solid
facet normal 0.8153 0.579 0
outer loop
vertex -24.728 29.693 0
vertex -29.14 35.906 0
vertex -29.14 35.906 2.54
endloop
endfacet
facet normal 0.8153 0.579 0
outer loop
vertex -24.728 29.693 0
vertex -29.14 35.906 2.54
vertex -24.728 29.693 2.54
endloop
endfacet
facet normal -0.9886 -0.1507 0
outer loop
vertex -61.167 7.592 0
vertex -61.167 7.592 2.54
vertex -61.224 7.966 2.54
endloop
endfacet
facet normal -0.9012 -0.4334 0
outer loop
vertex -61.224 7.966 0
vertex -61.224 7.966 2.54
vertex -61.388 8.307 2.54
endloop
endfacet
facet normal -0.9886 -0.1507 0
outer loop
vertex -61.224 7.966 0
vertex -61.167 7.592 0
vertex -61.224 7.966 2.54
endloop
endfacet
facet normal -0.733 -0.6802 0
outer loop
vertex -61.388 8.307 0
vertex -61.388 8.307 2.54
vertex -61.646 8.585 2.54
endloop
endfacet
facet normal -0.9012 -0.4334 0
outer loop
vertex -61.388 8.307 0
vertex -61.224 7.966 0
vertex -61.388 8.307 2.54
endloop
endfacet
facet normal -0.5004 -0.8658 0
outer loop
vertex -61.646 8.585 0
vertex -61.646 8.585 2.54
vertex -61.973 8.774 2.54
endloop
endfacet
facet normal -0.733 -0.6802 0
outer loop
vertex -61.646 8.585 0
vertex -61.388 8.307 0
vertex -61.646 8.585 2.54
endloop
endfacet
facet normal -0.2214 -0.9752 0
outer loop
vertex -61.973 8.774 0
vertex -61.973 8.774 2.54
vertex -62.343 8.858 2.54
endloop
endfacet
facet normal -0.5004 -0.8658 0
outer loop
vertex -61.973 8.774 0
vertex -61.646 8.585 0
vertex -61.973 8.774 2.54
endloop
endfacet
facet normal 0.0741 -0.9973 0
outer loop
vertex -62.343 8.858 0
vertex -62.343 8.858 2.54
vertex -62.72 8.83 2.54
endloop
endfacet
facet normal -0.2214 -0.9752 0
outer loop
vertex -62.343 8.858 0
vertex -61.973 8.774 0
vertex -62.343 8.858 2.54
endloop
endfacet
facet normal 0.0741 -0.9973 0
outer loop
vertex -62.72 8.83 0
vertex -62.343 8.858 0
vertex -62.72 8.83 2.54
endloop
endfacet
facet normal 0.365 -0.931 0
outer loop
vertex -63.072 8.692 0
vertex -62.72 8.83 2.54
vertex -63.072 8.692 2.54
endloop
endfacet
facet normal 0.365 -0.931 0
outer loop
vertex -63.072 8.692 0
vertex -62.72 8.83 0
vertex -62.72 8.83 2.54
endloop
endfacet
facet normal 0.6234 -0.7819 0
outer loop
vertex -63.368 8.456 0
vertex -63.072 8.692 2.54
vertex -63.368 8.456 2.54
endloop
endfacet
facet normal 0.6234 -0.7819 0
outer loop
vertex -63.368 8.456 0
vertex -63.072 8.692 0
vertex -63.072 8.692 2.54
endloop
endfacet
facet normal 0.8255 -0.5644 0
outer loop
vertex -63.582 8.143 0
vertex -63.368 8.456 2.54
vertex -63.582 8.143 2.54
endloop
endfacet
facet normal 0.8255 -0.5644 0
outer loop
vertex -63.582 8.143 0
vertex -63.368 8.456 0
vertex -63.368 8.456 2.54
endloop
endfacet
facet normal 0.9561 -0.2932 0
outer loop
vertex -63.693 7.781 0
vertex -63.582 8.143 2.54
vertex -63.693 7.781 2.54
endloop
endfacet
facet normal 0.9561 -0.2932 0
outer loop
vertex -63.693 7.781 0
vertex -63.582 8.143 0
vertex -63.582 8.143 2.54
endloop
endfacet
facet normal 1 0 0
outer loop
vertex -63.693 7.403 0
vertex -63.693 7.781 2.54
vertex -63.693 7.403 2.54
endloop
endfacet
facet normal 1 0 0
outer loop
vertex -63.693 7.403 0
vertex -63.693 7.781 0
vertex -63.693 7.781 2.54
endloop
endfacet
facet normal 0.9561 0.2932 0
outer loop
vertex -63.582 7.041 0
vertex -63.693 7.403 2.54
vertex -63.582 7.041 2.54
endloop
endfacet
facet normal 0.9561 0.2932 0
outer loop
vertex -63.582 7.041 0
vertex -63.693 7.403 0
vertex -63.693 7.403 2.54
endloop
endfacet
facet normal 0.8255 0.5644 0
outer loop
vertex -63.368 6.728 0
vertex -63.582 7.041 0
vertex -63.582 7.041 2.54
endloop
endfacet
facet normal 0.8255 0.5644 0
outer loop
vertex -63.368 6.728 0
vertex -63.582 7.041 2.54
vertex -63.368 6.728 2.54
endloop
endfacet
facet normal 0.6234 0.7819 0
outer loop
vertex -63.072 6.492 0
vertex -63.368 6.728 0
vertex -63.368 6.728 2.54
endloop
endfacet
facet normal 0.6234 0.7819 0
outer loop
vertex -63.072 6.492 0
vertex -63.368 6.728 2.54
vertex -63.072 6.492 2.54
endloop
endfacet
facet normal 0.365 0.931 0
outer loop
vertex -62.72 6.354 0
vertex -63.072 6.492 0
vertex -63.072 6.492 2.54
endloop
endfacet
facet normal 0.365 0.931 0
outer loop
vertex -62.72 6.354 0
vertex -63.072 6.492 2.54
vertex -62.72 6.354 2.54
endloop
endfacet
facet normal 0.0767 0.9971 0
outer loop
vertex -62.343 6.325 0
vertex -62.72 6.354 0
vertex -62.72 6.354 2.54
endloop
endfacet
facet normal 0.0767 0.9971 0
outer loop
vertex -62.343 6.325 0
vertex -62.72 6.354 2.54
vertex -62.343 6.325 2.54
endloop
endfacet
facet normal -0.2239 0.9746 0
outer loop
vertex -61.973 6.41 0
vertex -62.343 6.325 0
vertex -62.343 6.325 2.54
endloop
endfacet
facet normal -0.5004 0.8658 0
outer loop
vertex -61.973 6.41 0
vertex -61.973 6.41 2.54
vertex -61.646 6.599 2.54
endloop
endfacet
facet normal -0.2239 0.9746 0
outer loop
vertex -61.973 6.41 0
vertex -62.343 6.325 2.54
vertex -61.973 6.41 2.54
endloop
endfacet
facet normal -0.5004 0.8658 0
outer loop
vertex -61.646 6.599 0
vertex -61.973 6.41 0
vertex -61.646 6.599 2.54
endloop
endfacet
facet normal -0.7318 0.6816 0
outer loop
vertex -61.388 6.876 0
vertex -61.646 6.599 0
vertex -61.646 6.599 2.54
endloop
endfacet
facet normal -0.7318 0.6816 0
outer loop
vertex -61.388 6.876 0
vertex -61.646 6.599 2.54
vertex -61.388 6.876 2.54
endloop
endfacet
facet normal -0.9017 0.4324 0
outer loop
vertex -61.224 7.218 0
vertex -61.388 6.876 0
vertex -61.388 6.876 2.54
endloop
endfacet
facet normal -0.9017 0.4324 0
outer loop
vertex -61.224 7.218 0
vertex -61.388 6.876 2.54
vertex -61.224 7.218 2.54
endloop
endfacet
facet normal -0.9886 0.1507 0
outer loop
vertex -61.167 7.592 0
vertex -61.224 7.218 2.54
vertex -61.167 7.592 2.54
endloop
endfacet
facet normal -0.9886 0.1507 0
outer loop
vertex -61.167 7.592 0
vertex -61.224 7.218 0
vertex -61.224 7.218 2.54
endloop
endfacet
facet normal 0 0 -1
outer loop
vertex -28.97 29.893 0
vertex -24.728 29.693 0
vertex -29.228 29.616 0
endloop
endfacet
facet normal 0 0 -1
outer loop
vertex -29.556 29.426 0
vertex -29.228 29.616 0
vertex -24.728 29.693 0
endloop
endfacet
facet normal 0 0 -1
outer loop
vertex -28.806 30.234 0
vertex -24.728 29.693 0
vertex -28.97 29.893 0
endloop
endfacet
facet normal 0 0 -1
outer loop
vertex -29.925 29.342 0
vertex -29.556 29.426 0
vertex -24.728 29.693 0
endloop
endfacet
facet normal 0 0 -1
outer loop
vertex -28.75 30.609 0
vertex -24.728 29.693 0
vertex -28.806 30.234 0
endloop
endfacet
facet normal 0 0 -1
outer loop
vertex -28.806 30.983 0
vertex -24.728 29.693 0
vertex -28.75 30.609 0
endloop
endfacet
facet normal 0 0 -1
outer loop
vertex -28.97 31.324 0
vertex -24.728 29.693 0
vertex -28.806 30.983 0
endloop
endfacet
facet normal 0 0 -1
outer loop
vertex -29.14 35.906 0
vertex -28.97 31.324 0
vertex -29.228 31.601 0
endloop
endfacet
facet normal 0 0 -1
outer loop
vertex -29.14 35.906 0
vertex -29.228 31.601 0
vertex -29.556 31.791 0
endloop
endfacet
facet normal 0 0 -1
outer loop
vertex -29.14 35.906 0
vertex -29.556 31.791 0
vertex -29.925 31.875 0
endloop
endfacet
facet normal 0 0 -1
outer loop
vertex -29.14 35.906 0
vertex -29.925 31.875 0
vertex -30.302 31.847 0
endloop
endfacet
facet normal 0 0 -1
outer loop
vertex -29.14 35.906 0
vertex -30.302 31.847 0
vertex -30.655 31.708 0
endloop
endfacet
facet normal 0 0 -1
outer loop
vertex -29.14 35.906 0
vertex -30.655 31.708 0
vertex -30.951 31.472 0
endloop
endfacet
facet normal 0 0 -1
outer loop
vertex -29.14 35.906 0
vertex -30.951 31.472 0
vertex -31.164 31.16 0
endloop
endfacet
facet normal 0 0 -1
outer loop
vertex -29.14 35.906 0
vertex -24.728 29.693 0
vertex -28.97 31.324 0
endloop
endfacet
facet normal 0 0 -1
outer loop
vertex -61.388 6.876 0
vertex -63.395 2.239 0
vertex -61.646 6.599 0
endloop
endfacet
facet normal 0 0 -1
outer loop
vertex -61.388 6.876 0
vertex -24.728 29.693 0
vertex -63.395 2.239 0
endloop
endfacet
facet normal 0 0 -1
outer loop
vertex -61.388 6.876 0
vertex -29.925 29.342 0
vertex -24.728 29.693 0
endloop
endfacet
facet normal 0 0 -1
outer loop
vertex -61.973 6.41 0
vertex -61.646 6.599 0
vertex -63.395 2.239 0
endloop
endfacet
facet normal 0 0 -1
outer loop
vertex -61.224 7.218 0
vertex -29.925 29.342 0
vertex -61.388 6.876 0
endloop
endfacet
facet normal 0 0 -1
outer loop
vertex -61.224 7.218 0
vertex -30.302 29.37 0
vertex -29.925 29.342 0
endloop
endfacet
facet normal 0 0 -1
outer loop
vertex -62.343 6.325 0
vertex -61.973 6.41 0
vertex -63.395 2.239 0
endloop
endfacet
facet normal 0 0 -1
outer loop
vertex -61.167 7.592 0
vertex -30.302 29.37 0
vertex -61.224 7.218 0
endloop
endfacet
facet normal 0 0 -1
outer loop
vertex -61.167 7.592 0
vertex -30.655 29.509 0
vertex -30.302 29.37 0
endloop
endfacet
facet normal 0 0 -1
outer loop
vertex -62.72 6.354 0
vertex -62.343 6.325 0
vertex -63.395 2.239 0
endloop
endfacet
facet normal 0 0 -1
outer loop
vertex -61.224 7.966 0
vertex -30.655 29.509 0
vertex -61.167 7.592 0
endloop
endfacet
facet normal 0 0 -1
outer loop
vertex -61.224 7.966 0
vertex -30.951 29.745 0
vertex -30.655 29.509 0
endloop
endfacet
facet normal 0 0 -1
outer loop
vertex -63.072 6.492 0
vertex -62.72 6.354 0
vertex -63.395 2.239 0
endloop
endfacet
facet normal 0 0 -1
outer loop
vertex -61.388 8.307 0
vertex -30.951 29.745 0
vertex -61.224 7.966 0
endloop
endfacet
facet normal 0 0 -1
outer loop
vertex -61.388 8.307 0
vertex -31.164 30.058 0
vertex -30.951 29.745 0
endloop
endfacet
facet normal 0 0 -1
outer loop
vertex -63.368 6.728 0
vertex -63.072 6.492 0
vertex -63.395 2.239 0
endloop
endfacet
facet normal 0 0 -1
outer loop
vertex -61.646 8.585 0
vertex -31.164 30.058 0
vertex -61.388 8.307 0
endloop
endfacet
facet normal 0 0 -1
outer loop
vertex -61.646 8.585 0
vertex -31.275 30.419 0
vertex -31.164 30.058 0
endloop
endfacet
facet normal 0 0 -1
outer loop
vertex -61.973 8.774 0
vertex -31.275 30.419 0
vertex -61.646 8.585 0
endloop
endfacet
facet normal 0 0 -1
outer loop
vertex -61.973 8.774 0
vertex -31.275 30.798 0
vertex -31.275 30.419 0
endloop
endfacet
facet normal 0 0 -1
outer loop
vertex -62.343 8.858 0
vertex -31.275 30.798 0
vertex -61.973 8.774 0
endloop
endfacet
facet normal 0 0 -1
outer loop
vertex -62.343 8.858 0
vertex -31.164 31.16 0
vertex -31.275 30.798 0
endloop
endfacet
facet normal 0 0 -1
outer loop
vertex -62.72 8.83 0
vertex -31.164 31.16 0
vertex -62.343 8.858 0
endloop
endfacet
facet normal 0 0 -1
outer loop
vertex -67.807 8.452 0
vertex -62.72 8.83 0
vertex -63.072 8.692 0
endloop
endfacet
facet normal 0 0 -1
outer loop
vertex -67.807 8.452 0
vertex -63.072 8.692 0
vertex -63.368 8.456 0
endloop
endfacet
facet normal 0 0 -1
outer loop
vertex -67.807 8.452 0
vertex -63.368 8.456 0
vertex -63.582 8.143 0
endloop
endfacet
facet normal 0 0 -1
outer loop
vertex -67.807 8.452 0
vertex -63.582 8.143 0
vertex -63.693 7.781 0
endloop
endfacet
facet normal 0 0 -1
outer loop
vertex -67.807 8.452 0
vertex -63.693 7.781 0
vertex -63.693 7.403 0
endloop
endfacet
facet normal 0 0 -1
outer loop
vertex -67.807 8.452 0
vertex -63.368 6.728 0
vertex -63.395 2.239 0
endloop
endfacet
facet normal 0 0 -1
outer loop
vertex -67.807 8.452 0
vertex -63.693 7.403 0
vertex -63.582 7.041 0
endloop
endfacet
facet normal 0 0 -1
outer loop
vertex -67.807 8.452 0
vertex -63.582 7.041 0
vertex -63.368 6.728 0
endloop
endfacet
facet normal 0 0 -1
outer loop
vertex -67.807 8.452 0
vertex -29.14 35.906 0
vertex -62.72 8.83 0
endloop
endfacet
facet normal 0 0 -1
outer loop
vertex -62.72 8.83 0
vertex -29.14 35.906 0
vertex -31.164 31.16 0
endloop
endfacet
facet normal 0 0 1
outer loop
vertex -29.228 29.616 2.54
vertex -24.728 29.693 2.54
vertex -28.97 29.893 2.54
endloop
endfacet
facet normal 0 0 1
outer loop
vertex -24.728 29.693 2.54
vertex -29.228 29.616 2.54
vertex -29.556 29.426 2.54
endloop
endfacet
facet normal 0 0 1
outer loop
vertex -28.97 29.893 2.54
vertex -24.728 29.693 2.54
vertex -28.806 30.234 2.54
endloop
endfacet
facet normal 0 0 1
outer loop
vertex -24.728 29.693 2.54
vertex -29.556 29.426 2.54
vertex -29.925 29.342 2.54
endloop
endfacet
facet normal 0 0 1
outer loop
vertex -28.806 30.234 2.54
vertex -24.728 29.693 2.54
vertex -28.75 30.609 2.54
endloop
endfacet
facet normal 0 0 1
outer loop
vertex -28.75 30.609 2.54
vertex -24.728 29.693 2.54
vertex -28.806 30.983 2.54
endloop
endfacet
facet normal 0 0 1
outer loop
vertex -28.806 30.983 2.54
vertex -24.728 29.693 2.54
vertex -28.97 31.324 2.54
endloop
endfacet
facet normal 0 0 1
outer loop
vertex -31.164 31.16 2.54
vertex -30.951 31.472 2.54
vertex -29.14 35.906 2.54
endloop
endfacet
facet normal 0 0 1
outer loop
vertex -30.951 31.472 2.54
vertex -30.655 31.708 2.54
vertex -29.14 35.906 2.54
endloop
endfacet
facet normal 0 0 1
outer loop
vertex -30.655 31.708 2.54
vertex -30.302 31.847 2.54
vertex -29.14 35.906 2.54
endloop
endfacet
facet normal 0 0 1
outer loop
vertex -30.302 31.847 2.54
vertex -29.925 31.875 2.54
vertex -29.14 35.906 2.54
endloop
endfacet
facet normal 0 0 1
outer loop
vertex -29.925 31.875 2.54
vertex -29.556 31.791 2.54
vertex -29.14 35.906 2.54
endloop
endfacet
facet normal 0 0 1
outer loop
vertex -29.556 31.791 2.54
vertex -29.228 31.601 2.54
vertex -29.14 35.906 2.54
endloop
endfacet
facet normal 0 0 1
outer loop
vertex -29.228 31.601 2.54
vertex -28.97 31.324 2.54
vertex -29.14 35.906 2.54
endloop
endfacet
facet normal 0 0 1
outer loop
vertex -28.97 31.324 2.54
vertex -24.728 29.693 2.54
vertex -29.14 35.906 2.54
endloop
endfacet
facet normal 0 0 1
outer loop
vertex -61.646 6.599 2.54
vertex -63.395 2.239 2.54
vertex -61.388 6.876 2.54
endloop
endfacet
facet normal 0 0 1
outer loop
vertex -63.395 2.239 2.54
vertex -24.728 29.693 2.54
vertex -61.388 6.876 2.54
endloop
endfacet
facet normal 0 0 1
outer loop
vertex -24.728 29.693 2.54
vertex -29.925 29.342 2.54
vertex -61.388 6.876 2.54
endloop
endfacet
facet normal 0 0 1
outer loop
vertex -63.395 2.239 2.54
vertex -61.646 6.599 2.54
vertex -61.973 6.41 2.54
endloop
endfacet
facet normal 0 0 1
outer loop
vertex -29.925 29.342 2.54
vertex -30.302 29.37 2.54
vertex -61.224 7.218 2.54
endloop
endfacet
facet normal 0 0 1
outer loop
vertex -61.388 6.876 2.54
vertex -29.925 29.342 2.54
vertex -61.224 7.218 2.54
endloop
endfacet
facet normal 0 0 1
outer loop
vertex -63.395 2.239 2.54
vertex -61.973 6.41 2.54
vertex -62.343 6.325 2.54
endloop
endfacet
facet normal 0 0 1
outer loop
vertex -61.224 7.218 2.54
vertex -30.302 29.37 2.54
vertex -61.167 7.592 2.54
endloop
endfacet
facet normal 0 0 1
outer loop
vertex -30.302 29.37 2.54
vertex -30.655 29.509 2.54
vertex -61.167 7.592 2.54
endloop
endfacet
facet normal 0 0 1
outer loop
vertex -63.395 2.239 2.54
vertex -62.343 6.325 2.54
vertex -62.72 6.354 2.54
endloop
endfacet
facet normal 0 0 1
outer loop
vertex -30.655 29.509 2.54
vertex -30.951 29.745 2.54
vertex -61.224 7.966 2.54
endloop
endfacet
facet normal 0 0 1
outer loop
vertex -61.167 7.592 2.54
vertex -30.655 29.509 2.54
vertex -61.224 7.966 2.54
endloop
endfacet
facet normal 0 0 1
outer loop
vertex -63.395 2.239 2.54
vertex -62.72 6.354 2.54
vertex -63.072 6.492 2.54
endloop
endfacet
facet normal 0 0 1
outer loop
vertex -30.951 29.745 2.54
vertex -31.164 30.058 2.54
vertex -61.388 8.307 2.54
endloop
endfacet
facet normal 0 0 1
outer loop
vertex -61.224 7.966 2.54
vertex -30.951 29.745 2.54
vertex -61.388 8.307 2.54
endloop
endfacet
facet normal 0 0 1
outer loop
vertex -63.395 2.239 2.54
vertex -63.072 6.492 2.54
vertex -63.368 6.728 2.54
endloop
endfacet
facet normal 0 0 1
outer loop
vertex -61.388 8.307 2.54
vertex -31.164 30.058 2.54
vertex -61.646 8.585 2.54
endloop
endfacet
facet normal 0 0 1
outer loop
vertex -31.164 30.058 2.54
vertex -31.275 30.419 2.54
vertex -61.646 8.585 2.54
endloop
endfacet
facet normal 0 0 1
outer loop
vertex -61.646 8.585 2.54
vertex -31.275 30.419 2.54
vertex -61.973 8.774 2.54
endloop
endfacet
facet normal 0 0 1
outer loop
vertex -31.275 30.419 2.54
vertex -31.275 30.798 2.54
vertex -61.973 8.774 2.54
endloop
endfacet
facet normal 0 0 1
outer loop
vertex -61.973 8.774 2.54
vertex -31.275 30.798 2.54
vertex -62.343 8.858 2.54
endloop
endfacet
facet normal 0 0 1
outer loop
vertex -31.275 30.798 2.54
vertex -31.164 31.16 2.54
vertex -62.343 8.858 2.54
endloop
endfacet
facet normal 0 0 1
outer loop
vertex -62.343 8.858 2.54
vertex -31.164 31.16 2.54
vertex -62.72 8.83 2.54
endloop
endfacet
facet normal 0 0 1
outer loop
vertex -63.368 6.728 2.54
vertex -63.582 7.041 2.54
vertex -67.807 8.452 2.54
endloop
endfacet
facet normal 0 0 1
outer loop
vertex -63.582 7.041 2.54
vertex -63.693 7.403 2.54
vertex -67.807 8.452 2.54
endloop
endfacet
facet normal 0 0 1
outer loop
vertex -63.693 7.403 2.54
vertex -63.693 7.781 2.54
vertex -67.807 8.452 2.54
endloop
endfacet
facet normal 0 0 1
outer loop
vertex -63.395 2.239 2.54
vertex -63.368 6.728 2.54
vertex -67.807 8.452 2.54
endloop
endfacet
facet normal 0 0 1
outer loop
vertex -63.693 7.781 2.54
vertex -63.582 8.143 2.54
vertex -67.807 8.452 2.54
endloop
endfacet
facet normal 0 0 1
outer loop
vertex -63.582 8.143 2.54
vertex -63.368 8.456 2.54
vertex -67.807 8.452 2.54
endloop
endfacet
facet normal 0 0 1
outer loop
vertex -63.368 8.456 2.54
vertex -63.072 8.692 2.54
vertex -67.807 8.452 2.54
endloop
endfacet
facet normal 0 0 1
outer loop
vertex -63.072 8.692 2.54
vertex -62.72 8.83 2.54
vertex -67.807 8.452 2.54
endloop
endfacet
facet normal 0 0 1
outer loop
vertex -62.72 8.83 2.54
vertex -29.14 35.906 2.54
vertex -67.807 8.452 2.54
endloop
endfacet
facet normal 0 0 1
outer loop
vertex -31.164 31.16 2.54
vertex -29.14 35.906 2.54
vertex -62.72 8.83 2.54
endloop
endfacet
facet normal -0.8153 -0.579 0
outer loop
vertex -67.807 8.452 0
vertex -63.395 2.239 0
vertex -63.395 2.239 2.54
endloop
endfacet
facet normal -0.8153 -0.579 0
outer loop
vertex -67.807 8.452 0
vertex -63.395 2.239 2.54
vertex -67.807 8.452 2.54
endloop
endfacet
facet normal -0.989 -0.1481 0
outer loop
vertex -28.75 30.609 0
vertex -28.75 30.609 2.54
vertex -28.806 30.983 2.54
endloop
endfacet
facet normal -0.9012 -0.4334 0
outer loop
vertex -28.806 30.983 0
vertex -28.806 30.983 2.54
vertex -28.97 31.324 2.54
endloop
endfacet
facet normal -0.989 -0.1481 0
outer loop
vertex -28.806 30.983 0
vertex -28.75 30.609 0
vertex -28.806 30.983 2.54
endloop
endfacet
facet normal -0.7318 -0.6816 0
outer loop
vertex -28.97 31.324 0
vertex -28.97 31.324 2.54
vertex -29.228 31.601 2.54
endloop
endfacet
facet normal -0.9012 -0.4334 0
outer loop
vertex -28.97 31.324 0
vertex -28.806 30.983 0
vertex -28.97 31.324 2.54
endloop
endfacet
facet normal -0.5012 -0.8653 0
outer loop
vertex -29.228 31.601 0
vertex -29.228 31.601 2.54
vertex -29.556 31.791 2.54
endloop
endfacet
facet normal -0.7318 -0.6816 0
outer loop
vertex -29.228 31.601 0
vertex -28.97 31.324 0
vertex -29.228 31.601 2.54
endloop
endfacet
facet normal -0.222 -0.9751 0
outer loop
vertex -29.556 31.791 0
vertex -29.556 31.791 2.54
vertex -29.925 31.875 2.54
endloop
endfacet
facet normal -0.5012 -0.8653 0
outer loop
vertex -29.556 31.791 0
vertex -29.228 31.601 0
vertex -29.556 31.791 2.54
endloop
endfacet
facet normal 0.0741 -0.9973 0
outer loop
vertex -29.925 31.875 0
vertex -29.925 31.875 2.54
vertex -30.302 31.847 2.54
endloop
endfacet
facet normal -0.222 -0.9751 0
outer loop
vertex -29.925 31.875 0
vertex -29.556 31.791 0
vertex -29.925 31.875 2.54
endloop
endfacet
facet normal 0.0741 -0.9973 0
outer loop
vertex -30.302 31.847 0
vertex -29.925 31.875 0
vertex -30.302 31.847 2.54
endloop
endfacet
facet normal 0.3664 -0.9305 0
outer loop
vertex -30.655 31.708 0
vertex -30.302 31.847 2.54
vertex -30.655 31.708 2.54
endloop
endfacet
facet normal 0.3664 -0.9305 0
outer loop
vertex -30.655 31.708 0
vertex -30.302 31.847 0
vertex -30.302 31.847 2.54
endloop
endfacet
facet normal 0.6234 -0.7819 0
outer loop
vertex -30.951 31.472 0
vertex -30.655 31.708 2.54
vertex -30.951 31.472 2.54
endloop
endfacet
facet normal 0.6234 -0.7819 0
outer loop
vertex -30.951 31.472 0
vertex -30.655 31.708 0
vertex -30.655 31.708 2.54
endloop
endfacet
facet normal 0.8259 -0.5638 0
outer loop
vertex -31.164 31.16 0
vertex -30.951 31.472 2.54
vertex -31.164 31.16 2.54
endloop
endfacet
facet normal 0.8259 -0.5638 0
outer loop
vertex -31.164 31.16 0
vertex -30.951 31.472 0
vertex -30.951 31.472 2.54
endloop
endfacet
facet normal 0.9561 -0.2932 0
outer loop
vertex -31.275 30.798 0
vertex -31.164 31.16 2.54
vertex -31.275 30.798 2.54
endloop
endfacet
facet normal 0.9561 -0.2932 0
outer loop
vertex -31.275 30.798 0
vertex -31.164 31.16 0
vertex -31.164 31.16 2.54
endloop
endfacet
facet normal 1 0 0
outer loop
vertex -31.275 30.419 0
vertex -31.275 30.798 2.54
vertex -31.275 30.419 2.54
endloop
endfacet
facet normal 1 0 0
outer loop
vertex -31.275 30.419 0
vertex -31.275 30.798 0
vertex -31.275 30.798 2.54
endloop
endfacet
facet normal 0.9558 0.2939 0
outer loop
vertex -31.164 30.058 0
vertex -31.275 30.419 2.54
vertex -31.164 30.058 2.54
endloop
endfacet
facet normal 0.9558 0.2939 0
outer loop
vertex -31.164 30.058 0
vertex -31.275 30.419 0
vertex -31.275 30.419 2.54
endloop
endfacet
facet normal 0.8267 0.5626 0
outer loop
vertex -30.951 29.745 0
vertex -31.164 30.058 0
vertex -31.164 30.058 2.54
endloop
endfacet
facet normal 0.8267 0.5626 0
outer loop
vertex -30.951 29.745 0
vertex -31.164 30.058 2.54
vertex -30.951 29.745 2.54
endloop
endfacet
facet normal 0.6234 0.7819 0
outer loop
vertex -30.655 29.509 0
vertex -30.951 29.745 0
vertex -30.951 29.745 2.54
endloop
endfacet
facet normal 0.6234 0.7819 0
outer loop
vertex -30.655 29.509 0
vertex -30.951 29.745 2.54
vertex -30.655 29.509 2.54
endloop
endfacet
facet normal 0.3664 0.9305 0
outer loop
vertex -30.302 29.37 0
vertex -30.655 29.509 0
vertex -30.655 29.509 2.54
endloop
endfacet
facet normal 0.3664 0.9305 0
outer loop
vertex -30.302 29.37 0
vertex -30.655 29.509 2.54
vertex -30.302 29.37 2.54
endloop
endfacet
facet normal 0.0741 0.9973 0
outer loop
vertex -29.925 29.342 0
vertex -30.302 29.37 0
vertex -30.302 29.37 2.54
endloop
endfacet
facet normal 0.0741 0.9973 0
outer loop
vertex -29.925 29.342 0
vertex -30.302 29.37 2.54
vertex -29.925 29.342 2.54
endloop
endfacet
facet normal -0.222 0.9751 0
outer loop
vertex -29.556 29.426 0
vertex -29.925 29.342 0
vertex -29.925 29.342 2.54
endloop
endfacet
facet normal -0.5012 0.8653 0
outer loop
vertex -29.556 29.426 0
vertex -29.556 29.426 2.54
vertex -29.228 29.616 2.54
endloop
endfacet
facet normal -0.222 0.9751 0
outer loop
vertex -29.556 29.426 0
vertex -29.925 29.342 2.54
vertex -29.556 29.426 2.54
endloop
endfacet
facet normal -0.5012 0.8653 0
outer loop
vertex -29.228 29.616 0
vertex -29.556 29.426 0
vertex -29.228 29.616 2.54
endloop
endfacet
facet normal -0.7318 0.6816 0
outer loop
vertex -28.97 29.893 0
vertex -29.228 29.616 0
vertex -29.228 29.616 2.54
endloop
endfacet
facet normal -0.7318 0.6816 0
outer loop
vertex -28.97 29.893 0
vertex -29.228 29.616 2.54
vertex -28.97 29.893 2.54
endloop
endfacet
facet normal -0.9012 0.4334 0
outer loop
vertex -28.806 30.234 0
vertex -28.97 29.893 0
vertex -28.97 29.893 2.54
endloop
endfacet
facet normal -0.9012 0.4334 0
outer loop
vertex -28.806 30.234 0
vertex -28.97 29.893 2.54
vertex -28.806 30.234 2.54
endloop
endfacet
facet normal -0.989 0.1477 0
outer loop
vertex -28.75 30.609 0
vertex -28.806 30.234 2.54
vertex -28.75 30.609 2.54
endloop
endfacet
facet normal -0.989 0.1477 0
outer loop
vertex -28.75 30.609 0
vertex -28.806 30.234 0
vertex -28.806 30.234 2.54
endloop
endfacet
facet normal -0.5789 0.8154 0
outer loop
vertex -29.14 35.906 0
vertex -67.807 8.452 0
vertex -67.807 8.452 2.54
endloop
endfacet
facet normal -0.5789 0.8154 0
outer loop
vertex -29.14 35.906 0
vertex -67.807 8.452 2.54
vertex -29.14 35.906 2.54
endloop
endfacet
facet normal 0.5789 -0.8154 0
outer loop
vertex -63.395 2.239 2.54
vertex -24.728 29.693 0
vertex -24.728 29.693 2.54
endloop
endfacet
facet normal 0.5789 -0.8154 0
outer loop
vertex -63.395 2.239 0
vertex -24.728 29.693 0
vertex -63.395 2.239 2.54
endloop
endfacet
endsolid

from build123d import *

# Parameters (mm, degrees)
BOSS_EXTRUDE1_DEPTH = 2.54
SKETCH1_4_R         = 1.27
CUT_EXTRUDE1_DEPTH  = 3.302


with BuildPart() as part:
    # Sketch1 → Boss-Extrude1 (new body)
    with BuildSketch(Plane.XY):
        Polygon((-67.806668191, 8.452347061), (-29.139739371, 35.905866523), (-24.728354348, 29.69264818), (-63.395283168, 2.239128718), align=None)
    extrude(amount=BOSS_EXTRUDE1_DEPTH)

    # Sketch1<4> → Cut-Extrude1 (cut)
    with BuildSketch(Plane.XY):
        with Locations((-62.437432462, 7.591853574)):
            Circle(SKETCH1_4_R)
        with Locations((-30.019544177, 30.608554257)):
            Circle(SKETCH1_4_R)
    extrude(amount=CUT_EXTRUDE1_DEPTH, mode=Mode.SUBTRACT)


solid = part.part
